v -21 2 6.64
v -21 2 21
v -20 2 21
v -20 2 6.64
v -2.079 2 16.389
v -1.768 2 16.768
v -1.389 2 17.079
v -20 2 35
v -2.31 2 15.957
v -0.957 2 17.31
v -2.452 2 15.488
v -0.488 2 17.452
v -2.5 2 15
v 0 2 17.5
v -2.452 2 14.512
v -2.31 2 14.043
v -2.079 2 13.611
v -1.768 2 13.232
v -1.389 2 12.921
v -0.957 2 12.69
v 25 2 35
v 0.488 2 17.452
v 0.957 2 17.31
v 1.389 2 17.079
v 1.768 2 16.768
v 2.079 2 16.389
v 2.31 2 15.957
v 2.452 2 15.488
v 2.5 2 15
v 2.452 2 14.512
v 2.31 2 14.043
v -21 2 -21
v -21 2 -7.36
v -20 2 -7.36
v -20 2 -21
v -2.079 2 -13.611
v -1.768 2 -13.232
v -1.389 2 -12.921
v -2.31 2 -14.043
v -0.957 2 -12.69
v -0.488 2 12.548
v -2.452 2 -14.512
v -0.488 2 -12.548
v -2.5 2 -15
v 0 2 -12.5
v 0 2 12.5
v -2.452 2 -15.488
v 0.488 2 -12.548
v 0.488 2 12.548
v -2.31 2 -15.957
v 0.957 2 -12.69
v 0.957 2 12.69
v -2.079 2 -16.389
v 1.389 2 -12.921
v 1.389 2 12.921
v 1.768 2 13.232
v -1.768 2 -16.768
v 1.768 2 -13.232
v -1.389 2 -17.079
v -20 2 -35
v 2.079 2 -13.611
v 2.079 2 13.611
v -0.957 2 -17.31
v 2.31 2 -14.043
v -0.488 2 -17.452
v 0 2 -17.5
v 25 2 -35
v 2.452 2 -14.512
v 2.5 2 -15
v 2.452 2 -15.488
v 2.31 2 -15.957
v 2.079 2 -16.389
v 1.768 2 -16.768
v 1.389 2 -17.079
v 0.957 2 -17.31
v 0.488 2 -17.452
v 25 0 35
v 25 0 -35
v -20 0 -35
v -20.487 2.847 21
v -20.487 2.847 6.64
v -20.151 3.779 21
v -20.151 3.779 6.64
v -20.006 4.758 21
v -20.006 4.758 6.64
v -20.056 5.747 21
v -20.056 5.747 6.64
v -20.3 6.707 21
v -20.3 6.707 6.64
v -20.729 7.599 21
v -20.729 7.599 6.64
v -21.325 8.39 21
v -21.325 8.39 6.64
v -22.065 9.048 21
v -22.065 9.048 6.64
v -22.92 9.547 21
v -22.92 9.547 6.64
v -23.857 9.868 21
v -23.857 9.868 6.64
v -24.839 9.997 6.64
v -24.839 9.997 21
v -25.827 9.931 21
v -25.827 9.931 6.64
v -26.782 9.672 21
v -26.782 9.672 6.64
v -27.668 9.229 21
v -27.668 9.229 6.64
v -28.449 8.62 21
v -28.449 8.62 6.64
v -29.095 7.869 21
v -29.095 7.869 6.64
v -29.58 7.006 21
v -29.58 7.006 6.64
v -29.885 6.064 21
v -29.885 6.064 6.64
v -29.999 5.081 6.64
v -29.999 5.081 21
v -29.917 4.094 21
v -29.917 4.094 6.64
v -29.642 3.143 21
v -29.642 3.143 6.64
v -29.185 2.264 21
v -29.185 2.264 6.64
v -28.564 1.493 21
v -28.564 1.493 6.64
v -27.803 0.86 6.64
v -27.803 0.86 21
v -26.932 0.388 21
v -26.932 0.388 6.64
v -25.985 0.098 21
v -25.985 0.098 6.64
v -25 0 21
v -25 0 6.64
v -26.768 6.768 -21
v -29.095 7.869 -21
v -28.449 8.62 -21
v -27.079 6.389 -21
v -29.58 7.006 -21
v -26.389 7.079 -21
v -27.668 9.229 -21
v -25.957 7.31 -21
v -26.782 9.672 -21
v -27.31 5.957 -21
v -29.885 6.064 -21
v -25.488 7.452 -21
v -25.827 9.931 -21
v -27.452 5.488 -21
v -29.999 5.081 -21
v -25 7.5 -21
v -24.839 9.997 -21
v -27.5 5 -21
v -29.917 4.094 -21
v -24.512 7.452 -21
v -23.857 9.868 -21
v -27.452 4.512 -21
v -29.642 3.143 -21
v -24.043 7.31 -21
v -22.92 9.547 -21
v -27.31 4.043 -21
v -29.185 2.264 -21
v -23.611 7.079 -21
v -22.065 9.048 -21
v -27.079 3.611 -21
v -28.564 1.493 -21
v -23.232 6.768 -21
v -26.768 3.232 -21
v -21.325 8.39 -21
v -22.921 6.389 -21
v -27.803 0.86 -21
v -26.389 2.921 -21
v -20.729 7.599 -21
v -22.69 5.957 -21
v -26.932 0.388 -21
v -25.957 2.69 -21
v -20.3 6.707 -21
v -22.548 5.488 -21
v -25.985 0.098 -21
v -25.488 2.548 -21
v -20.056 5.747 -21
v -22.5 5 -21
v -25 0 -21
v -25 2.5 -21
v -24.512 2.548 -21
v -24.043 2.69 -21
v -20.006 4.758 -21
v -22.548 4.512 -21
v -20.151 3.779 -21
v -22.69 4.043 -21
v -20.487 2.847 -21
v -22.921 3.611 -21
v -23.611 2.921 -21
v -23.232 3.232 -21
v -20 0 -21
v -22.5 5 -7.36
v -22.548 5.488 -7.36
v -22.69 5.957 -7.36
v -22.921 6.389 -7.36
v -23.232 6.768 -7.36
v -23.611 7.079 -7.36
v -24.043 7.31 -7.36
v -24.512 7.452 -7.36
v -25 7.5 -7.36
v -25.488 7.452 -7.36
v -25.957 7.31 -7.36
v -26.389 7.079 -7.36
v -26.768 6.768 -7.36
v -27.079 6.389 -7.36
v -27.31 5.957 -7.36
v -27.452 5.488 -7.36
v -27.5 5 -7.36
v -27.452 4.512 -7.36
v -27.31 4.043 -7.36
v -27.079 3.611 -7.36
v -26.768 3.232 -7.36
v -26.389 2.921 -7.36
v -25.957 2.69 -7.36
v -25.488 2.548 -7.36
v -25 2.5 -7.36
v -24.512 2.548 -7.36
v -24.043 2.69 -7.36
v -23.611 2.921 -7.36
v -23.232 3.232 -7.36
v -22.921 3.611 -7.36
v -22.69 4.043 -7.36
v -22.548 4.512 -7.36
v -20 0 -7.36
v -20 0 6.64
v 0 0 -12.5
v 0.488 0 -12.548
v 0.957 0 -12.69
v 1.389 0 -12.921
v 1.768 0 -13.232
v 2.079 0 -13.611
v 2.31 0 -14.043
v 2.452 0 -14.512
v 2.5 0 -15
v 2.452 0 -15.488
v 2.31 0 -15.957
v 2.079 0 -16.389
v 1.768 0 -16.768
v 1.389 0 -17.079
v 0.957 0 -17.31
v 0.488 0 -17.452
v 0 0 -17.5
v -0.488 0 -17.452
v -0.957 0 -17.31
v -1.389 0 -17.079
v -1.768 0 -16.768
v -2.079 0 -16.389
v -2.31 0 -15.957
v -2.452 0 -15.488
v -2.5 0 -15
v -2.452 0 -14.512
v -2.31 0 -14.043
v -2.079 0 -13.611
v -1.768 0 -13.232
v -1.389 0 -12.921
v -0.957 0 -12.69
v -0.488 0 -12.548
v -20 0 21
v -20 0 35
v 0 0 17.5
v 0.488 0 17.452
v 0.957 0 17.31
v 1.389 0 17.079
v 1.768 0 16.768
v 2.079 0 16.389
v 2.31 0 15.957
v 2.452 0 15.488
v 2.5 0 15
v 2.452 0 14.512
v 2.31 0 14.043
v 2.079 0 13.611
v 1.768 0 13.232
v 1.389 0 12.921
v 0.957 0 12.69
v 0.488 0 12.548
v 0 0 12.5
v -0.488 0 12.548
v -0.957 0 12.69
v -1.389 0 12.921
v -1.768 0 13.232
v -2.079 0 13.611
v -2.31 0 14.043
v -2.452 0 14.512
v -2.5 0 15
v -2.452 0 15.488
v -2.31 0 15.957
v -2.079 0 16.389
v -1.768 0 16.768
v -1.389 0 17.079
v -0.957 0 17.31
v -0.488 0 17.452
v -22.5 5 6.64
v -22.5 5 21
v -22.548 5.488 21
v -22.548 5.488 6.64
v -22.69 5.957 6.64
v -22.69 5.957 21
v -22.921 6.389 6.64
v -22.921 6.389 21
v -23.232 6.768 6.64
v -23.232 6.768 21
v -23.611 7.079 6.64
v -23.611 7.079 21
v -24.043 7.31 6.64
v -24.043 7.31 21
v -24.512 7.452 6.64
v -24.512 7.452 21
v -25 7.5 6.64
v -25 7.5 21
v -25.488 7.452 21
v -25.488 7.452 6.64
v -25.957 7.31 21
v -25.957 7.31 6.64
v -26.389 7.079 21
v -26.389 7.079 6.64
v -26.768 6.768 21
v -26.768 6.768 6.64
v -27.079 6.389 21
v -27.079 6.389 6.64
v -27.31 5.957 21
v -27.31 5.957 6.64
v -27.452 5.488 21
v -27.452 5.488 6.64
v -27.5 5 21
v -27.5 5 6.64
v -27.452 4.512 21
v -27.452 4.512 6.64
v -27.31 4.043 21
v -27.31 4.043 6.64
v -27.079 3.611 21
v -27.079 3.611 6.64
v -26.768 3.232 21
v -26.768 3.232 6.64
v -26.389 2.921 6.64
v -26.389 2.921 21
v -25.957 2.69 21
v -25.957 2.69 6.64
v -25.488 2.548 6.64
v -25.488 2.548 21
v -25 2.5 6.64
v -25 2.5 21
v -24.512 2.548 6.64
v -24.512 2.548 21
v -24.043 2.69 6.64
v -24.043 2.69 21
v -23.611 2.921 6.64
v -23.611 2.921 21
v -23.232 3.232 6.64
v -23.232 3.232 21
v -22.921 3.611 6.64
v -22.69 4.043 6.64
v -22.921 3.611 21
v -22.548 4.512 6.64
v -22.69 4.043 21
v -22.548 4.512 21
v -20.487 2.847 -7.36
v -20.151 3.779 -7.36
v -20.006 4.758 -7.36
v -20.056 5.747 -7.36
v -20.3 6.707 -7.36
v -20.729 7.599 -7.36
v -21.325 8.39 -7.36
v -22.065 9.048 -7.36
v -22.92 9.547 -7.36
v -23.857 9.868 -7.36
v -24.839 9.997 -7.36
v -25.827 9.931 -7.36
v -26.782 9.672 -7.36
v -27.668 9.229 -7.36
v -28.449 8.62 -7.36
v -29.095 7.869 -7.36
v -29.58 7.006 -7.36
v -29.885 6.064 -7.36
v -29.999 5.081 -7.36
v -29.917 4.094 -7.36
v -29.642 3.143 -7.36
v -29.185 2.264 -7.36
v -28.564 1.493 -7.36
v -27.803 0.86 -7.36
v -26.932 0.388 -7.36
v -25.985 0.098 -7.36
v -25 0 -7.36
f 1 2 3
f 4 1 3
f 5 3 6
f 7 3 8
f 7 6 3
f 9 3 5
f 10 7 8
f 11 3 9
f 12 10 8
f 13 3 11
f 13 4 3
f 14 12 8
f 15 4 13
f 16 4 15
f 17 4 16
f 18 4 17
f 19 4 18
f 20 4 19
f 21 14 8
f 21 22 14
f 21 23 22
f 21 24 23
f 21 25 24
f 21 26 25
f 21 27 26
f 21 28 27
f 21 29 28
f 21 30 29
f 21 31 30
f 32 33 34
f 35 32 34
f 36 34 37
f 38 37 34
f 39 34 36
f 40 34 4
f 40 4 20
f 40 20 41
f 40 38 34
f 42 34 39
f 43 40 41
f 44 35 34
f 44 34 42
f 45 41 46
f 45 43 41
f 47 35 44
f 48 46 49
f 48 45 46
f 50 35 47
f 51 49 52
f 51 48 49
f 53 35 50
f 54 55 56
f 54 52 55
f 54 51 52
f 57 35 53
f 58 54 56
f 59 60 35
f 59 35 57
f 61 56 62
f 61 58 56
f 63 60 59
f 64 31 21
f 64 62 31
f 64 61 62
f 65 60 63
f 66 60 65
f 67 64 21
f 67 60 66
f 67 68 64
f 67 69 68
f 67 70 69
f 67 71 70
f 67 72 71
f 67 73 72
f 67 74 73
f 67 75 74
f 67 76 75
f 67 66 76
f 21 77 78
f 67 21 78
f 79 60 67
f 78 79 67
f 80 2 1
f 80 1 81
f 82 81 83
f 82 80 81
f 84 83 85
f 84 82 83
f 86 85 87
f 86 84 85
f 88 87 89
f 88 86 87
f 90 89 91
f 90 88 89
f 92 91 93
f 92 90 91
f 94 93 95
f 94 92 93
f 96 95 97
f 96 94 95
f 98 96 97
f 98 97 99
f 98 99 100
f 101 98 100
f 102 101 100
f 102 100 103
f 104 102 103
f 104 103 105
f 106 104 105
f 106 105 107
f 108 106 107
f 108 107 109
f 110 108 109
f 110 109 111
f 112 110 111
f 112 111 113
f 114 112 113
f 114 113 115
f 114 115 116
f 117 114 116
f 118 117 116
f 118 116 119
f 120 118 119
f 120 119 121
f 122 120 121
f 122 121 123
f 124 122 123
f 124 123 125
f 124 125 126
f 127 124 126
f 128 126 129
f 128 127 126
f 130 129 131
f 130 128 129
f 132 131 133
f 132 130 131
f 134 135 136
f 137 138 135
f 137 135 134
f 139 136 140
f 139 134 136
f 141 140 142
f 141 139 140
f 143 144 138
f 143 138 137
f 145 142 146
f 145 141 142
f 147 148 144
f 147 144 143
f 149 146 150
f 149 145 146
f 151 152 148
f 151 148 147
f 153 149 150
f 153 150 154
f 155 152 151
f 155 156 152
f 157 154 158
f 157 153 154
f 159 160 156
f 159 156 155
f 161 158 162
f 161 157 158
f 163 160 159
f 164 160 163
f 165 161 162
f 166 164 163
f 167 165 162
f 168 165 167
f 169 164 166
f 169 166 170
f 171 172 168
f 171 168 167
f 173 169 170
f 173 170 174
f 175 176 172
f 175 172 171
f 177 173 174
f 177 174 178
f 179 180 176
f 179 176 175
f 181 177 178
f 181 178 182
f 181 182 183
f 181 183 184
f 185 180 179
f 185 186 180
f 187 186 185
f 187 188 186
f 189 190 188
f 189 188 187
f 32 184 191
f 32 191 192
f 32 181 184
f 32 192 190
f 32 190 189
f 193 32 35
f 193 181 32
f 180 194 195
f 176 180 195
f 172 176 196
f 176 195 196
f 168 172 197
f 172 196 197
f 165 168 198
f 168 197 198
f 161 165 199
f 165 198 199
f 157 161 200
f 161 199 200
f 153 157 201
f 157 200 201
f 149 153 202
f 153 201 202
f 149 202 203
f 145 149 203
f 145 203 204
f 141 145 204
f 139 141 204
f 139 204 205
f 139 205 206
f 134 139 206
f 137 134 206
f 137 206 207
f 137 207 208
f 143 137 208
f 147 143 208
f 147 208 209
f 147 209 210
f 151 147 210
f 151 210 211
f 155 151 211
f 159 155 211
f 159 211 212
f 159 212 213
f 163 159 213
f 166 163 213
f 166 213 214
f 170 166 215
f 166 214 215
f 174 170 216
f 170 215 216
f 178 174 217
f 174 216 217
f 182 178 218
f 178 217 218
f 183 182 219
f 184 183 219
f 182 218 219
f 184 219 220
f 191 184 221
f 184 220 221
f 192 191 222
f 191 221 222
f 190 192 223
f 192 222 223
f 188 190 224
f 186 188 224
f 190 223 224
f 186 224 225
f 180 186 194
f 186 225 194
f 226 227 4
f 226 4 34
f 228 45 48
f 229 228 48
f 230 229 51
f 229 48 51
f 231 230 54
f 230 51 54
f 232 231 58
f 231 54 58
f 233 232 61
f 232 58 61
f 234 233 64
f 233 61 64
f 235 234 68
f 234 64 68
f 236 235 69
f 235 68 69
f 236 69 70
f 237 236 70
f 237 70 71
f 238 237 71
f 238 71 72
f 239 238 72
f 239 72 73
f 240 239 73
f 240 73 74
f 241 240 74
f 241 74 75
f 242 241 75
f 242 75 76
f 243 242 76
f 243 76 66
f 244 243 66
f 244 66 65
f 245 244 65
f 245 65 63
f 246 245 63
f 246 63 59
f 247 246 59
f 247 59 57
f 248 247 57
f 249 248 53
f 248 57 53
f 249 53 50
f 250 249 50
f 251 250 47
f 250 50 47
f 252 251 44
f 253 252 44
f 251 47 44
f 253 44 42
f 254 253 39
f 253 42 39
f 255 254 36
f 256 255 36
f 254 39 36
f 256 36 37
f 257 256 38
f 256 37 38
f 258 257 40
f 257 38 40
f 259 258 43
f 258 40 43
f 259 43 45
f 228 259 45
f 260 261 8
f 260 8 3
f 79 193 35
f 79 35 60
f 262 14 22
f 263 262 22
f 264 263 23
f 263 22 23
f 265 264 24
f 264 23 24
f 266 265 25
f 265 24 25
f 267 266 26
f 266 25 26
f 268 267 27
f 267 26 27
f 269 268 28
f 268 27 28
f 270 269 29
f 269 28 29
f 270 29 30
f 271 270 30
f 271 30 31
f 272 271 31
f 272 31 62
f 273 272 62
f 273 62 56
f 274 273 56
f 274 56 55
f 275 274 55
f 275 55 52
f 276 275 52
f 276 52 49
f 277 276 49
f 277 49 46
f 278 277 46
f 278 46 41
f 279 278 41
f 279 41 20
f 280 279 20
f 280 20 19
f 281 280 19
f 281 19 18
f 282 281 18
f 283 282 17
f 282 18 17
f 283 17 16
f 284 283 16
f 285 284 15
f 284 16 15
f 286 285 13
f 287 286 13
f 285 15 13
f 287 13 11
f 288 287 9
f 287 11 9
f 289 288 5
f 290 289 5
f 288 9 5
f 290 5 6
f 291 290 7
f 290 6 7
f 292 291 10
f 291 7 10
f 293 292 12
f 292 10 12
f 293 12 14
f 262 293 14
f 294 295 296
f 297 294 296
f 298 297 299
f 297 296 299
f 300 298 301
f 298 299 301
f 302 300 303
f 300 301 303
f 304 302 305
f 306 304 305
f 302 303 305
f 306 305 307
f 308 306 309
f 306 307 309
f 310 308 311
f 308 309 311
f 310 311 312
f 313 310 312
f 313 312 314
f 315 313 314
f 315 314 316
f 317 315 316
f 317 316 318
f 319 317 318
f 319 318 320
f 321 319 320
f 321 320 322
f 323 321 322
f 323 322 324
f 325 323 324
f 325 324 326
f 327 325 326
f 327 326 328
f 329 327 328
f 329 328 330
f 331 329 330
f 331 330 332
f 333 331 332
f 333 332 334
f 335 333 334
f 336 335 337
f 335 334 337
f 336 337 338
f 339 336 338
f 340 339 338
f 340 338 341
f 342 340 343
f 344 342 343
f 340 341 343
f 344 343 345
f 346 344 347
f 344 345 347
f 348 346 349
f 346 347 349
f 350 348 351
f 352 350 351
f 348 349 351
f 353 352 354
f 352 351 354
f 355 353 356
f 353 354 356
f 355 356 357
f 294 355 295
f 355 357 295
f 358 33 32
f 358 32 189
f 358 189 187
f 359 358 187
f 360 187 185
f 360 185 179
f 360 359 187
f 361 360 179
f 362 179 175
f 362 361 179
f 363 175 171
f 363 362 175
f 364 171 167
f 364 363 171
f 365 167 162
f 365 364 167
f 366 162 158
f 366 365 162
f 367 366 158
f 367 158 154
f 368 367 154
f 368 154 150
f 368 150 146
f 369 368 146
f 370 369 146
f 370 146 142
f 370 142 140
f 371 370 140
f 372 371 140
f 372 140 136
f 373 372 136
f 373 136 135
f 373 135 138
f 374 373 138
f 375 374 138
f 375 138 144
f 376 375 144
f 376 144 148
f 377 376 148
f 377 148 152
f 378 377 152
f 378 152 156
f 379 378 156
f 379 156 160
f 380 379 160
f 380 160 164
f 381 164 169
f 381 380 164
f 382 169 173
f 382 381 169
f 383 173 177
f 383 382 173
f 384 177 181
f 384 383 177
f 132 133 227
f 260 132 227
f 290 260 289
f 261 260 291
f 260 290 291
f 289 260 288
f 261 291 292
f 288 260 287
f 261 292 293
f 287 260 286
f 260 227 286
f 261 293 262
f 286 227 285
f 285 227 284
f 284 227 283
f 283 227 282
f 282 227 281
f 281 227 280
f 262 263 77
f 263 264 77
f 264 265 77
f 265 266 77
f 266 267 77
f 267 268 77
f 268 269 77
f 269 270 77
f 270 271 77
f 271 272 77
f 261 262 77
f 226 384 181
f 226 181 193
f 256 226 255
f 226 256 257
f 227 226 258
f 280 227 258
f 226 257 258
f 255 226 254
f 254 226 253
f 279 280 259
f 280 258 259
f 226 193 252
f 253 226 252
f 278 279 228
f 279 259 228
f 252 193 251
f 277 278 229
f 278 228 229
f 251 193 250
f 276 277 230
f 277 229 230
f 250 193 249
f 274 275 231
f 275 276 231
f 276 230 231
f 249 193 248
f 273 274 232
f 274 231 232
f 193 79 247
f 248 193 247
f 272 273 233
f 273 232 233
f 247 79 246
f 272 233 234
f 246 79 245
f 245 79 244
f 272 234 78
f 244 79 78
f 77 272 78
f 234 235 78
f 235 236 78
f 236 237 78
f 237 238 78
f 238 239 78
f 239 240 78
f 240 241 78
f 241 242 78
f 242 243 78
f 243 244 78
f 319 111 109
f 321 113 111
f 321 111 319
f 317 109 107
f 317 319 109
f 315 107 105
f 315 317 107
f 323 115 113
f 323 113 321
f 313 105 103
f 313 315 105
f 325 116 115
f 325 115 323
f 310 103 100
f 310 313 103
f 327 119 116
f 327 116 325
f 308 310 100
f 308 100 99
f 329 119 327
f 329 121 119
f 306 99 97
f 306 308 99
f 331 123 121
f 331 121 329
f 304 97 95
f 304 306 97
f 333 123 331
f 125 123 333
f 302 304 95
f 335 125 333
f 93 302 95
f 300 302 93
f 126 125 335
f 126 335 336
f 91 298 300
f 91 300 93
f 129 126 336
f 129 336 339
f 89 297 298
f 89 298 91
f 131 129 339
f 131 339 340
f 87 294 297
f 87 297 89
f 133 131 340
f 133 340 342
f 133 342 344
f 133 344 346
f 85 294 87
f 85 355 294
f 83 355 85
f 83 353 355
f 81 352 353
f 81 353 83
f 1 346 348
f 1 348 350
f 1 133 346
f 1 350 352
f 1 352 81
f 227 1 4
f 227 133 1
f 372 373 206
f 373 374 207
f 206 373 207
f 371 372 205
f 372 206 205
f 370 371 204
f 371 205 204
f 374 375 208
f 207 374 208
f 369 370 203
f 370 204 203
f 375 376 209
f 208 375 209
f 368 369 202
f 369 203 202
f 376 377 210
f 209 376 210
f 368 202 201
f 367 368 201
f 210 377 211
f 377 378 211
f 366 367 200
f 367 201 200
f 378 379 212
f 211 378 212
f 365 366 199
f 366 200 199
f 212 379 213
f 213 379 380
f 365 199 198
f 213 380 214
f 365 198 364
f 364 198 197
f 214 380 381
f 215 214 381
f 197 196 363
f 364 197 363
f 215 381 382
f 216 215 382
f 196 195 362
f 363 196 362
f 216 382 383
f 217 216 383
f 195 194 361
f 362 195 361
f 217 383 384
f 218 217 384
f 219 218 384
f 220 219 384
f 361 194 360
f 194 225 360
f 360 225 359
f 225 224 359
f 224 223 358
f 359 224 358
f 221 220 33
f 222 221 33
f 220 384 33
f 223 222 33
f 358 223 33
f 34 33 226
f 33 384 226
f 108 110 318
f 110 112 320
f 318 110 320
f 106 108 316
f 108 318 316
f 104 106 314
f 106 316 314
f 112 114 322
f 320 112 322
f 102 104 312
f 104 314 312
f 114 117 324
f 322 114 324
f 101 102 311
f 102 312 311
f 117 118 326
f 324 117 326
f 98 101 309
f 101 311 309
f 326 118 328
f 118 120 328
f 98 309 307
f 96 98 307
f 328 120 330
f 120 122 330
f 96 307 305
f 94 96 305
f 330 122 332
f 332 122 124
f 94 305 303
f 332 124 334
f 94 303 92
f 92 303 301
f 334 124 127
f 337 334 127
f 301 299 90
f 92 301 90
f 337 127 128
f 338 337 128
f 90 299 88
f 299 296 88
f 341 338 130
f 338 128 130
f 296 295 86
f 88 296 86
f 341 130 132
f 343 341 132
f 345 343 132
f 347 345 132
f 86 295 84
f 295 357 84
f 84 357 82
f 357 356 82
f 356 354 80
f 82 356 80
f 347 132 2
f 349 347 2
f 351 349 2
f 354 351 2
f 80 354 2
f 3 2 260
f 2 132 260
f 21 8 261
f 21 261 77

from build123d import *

# Parameters (mm, degrees)
SKETCH1_W               = 50
SKETCH1_H               = 70
BOSS_EXTRUDE1_DEPTH     = 2
SKETCH2_R               = 5
SKETCH2_R_2             = 2.5
BOSS_EXTRUDE2_DEPTH     = 70
SKETCH3_R               = 2.5
CUT_EXTRUDE1_DEPTH      = 47.786750261
CUT_EXTRUDE2_DEPTH      = 47.786750261
CUT_EXTRUDE2_DEPTH_BACK = 47.786750261
SKETCH4_W               = 10
SKETCH4_H               = 14


with BuildPart() as part:
    # Sketch1 → Boss-Extrude1 (new body)
    with BuildSketch(Plane(origin=(0, 0, 0), x_dir=(1, 0, 0), z_dir=(0, 1, 0))):
        Rectangle(SKETCH1_W, SKETCH1_H)
    extrude(amount=BOSS_EXTRUDE1_DEPTH)

    # Sketch2 → Boss-Extrude2 (add)
    with BuildSketch(Plane.XY.offset(35)):
        with Locations((-25, 5)):
            Circle(SKETCH2_R)
        with Locations((-25, 5)):
            Circle(SKETCH2_R_2, mode=Mode.SUBTRACT)
    extrude(amount=-BOSS_EXTRUDE2_DEPTH)

    # Sketch3 → Cut-Extrude1 (cut, through all)
    with BuildSketch(Plane(origin=(0, 2, 0), x_dir=(1, 0, 0), z_dir=(0, 1, 0))):
        with Locations(Location((0, 15, 0), (0, 0, 270))):
            Circle(SKETCH3_R)
        with Locations(Location((0, -15, 0), (0, 0, 270))):
            Circle(SKETCH3_R)
    extrude(amount=-CUT_EXTRUDE1_DEPTH, mode=Mode.SUBTRACT)

    # Sketch4 → Cut-Extrude2 (cut, two sides: drawn at the far end of the back side and taken through both)
    with BuildSketch(Plane(origin=(0, 2, 0), x_dir=(1, 0, 0), z_dir=(0, 1, 0)).offset(-CUT_EXTRUDE2_DEPTH_BACK)):
        with Locations((-25, 28)):
            Rectangle(SKETCH4_W, SKETCH4_H)
        with Locations((-25, 0.360390559)):
            Rectangle(SKETCH4_W, SKETCH4_H)
        with Locations((-25, -28)):
            Rectangle(SKETCH4_W, SKETCH4_H)
    extrude(amount=CUT_EXTRUDE2_DEPTH + CUT_EXTRUDE2_DEPTH_BACK, mode=Mode.SUBTRACT)


solid = part.part
